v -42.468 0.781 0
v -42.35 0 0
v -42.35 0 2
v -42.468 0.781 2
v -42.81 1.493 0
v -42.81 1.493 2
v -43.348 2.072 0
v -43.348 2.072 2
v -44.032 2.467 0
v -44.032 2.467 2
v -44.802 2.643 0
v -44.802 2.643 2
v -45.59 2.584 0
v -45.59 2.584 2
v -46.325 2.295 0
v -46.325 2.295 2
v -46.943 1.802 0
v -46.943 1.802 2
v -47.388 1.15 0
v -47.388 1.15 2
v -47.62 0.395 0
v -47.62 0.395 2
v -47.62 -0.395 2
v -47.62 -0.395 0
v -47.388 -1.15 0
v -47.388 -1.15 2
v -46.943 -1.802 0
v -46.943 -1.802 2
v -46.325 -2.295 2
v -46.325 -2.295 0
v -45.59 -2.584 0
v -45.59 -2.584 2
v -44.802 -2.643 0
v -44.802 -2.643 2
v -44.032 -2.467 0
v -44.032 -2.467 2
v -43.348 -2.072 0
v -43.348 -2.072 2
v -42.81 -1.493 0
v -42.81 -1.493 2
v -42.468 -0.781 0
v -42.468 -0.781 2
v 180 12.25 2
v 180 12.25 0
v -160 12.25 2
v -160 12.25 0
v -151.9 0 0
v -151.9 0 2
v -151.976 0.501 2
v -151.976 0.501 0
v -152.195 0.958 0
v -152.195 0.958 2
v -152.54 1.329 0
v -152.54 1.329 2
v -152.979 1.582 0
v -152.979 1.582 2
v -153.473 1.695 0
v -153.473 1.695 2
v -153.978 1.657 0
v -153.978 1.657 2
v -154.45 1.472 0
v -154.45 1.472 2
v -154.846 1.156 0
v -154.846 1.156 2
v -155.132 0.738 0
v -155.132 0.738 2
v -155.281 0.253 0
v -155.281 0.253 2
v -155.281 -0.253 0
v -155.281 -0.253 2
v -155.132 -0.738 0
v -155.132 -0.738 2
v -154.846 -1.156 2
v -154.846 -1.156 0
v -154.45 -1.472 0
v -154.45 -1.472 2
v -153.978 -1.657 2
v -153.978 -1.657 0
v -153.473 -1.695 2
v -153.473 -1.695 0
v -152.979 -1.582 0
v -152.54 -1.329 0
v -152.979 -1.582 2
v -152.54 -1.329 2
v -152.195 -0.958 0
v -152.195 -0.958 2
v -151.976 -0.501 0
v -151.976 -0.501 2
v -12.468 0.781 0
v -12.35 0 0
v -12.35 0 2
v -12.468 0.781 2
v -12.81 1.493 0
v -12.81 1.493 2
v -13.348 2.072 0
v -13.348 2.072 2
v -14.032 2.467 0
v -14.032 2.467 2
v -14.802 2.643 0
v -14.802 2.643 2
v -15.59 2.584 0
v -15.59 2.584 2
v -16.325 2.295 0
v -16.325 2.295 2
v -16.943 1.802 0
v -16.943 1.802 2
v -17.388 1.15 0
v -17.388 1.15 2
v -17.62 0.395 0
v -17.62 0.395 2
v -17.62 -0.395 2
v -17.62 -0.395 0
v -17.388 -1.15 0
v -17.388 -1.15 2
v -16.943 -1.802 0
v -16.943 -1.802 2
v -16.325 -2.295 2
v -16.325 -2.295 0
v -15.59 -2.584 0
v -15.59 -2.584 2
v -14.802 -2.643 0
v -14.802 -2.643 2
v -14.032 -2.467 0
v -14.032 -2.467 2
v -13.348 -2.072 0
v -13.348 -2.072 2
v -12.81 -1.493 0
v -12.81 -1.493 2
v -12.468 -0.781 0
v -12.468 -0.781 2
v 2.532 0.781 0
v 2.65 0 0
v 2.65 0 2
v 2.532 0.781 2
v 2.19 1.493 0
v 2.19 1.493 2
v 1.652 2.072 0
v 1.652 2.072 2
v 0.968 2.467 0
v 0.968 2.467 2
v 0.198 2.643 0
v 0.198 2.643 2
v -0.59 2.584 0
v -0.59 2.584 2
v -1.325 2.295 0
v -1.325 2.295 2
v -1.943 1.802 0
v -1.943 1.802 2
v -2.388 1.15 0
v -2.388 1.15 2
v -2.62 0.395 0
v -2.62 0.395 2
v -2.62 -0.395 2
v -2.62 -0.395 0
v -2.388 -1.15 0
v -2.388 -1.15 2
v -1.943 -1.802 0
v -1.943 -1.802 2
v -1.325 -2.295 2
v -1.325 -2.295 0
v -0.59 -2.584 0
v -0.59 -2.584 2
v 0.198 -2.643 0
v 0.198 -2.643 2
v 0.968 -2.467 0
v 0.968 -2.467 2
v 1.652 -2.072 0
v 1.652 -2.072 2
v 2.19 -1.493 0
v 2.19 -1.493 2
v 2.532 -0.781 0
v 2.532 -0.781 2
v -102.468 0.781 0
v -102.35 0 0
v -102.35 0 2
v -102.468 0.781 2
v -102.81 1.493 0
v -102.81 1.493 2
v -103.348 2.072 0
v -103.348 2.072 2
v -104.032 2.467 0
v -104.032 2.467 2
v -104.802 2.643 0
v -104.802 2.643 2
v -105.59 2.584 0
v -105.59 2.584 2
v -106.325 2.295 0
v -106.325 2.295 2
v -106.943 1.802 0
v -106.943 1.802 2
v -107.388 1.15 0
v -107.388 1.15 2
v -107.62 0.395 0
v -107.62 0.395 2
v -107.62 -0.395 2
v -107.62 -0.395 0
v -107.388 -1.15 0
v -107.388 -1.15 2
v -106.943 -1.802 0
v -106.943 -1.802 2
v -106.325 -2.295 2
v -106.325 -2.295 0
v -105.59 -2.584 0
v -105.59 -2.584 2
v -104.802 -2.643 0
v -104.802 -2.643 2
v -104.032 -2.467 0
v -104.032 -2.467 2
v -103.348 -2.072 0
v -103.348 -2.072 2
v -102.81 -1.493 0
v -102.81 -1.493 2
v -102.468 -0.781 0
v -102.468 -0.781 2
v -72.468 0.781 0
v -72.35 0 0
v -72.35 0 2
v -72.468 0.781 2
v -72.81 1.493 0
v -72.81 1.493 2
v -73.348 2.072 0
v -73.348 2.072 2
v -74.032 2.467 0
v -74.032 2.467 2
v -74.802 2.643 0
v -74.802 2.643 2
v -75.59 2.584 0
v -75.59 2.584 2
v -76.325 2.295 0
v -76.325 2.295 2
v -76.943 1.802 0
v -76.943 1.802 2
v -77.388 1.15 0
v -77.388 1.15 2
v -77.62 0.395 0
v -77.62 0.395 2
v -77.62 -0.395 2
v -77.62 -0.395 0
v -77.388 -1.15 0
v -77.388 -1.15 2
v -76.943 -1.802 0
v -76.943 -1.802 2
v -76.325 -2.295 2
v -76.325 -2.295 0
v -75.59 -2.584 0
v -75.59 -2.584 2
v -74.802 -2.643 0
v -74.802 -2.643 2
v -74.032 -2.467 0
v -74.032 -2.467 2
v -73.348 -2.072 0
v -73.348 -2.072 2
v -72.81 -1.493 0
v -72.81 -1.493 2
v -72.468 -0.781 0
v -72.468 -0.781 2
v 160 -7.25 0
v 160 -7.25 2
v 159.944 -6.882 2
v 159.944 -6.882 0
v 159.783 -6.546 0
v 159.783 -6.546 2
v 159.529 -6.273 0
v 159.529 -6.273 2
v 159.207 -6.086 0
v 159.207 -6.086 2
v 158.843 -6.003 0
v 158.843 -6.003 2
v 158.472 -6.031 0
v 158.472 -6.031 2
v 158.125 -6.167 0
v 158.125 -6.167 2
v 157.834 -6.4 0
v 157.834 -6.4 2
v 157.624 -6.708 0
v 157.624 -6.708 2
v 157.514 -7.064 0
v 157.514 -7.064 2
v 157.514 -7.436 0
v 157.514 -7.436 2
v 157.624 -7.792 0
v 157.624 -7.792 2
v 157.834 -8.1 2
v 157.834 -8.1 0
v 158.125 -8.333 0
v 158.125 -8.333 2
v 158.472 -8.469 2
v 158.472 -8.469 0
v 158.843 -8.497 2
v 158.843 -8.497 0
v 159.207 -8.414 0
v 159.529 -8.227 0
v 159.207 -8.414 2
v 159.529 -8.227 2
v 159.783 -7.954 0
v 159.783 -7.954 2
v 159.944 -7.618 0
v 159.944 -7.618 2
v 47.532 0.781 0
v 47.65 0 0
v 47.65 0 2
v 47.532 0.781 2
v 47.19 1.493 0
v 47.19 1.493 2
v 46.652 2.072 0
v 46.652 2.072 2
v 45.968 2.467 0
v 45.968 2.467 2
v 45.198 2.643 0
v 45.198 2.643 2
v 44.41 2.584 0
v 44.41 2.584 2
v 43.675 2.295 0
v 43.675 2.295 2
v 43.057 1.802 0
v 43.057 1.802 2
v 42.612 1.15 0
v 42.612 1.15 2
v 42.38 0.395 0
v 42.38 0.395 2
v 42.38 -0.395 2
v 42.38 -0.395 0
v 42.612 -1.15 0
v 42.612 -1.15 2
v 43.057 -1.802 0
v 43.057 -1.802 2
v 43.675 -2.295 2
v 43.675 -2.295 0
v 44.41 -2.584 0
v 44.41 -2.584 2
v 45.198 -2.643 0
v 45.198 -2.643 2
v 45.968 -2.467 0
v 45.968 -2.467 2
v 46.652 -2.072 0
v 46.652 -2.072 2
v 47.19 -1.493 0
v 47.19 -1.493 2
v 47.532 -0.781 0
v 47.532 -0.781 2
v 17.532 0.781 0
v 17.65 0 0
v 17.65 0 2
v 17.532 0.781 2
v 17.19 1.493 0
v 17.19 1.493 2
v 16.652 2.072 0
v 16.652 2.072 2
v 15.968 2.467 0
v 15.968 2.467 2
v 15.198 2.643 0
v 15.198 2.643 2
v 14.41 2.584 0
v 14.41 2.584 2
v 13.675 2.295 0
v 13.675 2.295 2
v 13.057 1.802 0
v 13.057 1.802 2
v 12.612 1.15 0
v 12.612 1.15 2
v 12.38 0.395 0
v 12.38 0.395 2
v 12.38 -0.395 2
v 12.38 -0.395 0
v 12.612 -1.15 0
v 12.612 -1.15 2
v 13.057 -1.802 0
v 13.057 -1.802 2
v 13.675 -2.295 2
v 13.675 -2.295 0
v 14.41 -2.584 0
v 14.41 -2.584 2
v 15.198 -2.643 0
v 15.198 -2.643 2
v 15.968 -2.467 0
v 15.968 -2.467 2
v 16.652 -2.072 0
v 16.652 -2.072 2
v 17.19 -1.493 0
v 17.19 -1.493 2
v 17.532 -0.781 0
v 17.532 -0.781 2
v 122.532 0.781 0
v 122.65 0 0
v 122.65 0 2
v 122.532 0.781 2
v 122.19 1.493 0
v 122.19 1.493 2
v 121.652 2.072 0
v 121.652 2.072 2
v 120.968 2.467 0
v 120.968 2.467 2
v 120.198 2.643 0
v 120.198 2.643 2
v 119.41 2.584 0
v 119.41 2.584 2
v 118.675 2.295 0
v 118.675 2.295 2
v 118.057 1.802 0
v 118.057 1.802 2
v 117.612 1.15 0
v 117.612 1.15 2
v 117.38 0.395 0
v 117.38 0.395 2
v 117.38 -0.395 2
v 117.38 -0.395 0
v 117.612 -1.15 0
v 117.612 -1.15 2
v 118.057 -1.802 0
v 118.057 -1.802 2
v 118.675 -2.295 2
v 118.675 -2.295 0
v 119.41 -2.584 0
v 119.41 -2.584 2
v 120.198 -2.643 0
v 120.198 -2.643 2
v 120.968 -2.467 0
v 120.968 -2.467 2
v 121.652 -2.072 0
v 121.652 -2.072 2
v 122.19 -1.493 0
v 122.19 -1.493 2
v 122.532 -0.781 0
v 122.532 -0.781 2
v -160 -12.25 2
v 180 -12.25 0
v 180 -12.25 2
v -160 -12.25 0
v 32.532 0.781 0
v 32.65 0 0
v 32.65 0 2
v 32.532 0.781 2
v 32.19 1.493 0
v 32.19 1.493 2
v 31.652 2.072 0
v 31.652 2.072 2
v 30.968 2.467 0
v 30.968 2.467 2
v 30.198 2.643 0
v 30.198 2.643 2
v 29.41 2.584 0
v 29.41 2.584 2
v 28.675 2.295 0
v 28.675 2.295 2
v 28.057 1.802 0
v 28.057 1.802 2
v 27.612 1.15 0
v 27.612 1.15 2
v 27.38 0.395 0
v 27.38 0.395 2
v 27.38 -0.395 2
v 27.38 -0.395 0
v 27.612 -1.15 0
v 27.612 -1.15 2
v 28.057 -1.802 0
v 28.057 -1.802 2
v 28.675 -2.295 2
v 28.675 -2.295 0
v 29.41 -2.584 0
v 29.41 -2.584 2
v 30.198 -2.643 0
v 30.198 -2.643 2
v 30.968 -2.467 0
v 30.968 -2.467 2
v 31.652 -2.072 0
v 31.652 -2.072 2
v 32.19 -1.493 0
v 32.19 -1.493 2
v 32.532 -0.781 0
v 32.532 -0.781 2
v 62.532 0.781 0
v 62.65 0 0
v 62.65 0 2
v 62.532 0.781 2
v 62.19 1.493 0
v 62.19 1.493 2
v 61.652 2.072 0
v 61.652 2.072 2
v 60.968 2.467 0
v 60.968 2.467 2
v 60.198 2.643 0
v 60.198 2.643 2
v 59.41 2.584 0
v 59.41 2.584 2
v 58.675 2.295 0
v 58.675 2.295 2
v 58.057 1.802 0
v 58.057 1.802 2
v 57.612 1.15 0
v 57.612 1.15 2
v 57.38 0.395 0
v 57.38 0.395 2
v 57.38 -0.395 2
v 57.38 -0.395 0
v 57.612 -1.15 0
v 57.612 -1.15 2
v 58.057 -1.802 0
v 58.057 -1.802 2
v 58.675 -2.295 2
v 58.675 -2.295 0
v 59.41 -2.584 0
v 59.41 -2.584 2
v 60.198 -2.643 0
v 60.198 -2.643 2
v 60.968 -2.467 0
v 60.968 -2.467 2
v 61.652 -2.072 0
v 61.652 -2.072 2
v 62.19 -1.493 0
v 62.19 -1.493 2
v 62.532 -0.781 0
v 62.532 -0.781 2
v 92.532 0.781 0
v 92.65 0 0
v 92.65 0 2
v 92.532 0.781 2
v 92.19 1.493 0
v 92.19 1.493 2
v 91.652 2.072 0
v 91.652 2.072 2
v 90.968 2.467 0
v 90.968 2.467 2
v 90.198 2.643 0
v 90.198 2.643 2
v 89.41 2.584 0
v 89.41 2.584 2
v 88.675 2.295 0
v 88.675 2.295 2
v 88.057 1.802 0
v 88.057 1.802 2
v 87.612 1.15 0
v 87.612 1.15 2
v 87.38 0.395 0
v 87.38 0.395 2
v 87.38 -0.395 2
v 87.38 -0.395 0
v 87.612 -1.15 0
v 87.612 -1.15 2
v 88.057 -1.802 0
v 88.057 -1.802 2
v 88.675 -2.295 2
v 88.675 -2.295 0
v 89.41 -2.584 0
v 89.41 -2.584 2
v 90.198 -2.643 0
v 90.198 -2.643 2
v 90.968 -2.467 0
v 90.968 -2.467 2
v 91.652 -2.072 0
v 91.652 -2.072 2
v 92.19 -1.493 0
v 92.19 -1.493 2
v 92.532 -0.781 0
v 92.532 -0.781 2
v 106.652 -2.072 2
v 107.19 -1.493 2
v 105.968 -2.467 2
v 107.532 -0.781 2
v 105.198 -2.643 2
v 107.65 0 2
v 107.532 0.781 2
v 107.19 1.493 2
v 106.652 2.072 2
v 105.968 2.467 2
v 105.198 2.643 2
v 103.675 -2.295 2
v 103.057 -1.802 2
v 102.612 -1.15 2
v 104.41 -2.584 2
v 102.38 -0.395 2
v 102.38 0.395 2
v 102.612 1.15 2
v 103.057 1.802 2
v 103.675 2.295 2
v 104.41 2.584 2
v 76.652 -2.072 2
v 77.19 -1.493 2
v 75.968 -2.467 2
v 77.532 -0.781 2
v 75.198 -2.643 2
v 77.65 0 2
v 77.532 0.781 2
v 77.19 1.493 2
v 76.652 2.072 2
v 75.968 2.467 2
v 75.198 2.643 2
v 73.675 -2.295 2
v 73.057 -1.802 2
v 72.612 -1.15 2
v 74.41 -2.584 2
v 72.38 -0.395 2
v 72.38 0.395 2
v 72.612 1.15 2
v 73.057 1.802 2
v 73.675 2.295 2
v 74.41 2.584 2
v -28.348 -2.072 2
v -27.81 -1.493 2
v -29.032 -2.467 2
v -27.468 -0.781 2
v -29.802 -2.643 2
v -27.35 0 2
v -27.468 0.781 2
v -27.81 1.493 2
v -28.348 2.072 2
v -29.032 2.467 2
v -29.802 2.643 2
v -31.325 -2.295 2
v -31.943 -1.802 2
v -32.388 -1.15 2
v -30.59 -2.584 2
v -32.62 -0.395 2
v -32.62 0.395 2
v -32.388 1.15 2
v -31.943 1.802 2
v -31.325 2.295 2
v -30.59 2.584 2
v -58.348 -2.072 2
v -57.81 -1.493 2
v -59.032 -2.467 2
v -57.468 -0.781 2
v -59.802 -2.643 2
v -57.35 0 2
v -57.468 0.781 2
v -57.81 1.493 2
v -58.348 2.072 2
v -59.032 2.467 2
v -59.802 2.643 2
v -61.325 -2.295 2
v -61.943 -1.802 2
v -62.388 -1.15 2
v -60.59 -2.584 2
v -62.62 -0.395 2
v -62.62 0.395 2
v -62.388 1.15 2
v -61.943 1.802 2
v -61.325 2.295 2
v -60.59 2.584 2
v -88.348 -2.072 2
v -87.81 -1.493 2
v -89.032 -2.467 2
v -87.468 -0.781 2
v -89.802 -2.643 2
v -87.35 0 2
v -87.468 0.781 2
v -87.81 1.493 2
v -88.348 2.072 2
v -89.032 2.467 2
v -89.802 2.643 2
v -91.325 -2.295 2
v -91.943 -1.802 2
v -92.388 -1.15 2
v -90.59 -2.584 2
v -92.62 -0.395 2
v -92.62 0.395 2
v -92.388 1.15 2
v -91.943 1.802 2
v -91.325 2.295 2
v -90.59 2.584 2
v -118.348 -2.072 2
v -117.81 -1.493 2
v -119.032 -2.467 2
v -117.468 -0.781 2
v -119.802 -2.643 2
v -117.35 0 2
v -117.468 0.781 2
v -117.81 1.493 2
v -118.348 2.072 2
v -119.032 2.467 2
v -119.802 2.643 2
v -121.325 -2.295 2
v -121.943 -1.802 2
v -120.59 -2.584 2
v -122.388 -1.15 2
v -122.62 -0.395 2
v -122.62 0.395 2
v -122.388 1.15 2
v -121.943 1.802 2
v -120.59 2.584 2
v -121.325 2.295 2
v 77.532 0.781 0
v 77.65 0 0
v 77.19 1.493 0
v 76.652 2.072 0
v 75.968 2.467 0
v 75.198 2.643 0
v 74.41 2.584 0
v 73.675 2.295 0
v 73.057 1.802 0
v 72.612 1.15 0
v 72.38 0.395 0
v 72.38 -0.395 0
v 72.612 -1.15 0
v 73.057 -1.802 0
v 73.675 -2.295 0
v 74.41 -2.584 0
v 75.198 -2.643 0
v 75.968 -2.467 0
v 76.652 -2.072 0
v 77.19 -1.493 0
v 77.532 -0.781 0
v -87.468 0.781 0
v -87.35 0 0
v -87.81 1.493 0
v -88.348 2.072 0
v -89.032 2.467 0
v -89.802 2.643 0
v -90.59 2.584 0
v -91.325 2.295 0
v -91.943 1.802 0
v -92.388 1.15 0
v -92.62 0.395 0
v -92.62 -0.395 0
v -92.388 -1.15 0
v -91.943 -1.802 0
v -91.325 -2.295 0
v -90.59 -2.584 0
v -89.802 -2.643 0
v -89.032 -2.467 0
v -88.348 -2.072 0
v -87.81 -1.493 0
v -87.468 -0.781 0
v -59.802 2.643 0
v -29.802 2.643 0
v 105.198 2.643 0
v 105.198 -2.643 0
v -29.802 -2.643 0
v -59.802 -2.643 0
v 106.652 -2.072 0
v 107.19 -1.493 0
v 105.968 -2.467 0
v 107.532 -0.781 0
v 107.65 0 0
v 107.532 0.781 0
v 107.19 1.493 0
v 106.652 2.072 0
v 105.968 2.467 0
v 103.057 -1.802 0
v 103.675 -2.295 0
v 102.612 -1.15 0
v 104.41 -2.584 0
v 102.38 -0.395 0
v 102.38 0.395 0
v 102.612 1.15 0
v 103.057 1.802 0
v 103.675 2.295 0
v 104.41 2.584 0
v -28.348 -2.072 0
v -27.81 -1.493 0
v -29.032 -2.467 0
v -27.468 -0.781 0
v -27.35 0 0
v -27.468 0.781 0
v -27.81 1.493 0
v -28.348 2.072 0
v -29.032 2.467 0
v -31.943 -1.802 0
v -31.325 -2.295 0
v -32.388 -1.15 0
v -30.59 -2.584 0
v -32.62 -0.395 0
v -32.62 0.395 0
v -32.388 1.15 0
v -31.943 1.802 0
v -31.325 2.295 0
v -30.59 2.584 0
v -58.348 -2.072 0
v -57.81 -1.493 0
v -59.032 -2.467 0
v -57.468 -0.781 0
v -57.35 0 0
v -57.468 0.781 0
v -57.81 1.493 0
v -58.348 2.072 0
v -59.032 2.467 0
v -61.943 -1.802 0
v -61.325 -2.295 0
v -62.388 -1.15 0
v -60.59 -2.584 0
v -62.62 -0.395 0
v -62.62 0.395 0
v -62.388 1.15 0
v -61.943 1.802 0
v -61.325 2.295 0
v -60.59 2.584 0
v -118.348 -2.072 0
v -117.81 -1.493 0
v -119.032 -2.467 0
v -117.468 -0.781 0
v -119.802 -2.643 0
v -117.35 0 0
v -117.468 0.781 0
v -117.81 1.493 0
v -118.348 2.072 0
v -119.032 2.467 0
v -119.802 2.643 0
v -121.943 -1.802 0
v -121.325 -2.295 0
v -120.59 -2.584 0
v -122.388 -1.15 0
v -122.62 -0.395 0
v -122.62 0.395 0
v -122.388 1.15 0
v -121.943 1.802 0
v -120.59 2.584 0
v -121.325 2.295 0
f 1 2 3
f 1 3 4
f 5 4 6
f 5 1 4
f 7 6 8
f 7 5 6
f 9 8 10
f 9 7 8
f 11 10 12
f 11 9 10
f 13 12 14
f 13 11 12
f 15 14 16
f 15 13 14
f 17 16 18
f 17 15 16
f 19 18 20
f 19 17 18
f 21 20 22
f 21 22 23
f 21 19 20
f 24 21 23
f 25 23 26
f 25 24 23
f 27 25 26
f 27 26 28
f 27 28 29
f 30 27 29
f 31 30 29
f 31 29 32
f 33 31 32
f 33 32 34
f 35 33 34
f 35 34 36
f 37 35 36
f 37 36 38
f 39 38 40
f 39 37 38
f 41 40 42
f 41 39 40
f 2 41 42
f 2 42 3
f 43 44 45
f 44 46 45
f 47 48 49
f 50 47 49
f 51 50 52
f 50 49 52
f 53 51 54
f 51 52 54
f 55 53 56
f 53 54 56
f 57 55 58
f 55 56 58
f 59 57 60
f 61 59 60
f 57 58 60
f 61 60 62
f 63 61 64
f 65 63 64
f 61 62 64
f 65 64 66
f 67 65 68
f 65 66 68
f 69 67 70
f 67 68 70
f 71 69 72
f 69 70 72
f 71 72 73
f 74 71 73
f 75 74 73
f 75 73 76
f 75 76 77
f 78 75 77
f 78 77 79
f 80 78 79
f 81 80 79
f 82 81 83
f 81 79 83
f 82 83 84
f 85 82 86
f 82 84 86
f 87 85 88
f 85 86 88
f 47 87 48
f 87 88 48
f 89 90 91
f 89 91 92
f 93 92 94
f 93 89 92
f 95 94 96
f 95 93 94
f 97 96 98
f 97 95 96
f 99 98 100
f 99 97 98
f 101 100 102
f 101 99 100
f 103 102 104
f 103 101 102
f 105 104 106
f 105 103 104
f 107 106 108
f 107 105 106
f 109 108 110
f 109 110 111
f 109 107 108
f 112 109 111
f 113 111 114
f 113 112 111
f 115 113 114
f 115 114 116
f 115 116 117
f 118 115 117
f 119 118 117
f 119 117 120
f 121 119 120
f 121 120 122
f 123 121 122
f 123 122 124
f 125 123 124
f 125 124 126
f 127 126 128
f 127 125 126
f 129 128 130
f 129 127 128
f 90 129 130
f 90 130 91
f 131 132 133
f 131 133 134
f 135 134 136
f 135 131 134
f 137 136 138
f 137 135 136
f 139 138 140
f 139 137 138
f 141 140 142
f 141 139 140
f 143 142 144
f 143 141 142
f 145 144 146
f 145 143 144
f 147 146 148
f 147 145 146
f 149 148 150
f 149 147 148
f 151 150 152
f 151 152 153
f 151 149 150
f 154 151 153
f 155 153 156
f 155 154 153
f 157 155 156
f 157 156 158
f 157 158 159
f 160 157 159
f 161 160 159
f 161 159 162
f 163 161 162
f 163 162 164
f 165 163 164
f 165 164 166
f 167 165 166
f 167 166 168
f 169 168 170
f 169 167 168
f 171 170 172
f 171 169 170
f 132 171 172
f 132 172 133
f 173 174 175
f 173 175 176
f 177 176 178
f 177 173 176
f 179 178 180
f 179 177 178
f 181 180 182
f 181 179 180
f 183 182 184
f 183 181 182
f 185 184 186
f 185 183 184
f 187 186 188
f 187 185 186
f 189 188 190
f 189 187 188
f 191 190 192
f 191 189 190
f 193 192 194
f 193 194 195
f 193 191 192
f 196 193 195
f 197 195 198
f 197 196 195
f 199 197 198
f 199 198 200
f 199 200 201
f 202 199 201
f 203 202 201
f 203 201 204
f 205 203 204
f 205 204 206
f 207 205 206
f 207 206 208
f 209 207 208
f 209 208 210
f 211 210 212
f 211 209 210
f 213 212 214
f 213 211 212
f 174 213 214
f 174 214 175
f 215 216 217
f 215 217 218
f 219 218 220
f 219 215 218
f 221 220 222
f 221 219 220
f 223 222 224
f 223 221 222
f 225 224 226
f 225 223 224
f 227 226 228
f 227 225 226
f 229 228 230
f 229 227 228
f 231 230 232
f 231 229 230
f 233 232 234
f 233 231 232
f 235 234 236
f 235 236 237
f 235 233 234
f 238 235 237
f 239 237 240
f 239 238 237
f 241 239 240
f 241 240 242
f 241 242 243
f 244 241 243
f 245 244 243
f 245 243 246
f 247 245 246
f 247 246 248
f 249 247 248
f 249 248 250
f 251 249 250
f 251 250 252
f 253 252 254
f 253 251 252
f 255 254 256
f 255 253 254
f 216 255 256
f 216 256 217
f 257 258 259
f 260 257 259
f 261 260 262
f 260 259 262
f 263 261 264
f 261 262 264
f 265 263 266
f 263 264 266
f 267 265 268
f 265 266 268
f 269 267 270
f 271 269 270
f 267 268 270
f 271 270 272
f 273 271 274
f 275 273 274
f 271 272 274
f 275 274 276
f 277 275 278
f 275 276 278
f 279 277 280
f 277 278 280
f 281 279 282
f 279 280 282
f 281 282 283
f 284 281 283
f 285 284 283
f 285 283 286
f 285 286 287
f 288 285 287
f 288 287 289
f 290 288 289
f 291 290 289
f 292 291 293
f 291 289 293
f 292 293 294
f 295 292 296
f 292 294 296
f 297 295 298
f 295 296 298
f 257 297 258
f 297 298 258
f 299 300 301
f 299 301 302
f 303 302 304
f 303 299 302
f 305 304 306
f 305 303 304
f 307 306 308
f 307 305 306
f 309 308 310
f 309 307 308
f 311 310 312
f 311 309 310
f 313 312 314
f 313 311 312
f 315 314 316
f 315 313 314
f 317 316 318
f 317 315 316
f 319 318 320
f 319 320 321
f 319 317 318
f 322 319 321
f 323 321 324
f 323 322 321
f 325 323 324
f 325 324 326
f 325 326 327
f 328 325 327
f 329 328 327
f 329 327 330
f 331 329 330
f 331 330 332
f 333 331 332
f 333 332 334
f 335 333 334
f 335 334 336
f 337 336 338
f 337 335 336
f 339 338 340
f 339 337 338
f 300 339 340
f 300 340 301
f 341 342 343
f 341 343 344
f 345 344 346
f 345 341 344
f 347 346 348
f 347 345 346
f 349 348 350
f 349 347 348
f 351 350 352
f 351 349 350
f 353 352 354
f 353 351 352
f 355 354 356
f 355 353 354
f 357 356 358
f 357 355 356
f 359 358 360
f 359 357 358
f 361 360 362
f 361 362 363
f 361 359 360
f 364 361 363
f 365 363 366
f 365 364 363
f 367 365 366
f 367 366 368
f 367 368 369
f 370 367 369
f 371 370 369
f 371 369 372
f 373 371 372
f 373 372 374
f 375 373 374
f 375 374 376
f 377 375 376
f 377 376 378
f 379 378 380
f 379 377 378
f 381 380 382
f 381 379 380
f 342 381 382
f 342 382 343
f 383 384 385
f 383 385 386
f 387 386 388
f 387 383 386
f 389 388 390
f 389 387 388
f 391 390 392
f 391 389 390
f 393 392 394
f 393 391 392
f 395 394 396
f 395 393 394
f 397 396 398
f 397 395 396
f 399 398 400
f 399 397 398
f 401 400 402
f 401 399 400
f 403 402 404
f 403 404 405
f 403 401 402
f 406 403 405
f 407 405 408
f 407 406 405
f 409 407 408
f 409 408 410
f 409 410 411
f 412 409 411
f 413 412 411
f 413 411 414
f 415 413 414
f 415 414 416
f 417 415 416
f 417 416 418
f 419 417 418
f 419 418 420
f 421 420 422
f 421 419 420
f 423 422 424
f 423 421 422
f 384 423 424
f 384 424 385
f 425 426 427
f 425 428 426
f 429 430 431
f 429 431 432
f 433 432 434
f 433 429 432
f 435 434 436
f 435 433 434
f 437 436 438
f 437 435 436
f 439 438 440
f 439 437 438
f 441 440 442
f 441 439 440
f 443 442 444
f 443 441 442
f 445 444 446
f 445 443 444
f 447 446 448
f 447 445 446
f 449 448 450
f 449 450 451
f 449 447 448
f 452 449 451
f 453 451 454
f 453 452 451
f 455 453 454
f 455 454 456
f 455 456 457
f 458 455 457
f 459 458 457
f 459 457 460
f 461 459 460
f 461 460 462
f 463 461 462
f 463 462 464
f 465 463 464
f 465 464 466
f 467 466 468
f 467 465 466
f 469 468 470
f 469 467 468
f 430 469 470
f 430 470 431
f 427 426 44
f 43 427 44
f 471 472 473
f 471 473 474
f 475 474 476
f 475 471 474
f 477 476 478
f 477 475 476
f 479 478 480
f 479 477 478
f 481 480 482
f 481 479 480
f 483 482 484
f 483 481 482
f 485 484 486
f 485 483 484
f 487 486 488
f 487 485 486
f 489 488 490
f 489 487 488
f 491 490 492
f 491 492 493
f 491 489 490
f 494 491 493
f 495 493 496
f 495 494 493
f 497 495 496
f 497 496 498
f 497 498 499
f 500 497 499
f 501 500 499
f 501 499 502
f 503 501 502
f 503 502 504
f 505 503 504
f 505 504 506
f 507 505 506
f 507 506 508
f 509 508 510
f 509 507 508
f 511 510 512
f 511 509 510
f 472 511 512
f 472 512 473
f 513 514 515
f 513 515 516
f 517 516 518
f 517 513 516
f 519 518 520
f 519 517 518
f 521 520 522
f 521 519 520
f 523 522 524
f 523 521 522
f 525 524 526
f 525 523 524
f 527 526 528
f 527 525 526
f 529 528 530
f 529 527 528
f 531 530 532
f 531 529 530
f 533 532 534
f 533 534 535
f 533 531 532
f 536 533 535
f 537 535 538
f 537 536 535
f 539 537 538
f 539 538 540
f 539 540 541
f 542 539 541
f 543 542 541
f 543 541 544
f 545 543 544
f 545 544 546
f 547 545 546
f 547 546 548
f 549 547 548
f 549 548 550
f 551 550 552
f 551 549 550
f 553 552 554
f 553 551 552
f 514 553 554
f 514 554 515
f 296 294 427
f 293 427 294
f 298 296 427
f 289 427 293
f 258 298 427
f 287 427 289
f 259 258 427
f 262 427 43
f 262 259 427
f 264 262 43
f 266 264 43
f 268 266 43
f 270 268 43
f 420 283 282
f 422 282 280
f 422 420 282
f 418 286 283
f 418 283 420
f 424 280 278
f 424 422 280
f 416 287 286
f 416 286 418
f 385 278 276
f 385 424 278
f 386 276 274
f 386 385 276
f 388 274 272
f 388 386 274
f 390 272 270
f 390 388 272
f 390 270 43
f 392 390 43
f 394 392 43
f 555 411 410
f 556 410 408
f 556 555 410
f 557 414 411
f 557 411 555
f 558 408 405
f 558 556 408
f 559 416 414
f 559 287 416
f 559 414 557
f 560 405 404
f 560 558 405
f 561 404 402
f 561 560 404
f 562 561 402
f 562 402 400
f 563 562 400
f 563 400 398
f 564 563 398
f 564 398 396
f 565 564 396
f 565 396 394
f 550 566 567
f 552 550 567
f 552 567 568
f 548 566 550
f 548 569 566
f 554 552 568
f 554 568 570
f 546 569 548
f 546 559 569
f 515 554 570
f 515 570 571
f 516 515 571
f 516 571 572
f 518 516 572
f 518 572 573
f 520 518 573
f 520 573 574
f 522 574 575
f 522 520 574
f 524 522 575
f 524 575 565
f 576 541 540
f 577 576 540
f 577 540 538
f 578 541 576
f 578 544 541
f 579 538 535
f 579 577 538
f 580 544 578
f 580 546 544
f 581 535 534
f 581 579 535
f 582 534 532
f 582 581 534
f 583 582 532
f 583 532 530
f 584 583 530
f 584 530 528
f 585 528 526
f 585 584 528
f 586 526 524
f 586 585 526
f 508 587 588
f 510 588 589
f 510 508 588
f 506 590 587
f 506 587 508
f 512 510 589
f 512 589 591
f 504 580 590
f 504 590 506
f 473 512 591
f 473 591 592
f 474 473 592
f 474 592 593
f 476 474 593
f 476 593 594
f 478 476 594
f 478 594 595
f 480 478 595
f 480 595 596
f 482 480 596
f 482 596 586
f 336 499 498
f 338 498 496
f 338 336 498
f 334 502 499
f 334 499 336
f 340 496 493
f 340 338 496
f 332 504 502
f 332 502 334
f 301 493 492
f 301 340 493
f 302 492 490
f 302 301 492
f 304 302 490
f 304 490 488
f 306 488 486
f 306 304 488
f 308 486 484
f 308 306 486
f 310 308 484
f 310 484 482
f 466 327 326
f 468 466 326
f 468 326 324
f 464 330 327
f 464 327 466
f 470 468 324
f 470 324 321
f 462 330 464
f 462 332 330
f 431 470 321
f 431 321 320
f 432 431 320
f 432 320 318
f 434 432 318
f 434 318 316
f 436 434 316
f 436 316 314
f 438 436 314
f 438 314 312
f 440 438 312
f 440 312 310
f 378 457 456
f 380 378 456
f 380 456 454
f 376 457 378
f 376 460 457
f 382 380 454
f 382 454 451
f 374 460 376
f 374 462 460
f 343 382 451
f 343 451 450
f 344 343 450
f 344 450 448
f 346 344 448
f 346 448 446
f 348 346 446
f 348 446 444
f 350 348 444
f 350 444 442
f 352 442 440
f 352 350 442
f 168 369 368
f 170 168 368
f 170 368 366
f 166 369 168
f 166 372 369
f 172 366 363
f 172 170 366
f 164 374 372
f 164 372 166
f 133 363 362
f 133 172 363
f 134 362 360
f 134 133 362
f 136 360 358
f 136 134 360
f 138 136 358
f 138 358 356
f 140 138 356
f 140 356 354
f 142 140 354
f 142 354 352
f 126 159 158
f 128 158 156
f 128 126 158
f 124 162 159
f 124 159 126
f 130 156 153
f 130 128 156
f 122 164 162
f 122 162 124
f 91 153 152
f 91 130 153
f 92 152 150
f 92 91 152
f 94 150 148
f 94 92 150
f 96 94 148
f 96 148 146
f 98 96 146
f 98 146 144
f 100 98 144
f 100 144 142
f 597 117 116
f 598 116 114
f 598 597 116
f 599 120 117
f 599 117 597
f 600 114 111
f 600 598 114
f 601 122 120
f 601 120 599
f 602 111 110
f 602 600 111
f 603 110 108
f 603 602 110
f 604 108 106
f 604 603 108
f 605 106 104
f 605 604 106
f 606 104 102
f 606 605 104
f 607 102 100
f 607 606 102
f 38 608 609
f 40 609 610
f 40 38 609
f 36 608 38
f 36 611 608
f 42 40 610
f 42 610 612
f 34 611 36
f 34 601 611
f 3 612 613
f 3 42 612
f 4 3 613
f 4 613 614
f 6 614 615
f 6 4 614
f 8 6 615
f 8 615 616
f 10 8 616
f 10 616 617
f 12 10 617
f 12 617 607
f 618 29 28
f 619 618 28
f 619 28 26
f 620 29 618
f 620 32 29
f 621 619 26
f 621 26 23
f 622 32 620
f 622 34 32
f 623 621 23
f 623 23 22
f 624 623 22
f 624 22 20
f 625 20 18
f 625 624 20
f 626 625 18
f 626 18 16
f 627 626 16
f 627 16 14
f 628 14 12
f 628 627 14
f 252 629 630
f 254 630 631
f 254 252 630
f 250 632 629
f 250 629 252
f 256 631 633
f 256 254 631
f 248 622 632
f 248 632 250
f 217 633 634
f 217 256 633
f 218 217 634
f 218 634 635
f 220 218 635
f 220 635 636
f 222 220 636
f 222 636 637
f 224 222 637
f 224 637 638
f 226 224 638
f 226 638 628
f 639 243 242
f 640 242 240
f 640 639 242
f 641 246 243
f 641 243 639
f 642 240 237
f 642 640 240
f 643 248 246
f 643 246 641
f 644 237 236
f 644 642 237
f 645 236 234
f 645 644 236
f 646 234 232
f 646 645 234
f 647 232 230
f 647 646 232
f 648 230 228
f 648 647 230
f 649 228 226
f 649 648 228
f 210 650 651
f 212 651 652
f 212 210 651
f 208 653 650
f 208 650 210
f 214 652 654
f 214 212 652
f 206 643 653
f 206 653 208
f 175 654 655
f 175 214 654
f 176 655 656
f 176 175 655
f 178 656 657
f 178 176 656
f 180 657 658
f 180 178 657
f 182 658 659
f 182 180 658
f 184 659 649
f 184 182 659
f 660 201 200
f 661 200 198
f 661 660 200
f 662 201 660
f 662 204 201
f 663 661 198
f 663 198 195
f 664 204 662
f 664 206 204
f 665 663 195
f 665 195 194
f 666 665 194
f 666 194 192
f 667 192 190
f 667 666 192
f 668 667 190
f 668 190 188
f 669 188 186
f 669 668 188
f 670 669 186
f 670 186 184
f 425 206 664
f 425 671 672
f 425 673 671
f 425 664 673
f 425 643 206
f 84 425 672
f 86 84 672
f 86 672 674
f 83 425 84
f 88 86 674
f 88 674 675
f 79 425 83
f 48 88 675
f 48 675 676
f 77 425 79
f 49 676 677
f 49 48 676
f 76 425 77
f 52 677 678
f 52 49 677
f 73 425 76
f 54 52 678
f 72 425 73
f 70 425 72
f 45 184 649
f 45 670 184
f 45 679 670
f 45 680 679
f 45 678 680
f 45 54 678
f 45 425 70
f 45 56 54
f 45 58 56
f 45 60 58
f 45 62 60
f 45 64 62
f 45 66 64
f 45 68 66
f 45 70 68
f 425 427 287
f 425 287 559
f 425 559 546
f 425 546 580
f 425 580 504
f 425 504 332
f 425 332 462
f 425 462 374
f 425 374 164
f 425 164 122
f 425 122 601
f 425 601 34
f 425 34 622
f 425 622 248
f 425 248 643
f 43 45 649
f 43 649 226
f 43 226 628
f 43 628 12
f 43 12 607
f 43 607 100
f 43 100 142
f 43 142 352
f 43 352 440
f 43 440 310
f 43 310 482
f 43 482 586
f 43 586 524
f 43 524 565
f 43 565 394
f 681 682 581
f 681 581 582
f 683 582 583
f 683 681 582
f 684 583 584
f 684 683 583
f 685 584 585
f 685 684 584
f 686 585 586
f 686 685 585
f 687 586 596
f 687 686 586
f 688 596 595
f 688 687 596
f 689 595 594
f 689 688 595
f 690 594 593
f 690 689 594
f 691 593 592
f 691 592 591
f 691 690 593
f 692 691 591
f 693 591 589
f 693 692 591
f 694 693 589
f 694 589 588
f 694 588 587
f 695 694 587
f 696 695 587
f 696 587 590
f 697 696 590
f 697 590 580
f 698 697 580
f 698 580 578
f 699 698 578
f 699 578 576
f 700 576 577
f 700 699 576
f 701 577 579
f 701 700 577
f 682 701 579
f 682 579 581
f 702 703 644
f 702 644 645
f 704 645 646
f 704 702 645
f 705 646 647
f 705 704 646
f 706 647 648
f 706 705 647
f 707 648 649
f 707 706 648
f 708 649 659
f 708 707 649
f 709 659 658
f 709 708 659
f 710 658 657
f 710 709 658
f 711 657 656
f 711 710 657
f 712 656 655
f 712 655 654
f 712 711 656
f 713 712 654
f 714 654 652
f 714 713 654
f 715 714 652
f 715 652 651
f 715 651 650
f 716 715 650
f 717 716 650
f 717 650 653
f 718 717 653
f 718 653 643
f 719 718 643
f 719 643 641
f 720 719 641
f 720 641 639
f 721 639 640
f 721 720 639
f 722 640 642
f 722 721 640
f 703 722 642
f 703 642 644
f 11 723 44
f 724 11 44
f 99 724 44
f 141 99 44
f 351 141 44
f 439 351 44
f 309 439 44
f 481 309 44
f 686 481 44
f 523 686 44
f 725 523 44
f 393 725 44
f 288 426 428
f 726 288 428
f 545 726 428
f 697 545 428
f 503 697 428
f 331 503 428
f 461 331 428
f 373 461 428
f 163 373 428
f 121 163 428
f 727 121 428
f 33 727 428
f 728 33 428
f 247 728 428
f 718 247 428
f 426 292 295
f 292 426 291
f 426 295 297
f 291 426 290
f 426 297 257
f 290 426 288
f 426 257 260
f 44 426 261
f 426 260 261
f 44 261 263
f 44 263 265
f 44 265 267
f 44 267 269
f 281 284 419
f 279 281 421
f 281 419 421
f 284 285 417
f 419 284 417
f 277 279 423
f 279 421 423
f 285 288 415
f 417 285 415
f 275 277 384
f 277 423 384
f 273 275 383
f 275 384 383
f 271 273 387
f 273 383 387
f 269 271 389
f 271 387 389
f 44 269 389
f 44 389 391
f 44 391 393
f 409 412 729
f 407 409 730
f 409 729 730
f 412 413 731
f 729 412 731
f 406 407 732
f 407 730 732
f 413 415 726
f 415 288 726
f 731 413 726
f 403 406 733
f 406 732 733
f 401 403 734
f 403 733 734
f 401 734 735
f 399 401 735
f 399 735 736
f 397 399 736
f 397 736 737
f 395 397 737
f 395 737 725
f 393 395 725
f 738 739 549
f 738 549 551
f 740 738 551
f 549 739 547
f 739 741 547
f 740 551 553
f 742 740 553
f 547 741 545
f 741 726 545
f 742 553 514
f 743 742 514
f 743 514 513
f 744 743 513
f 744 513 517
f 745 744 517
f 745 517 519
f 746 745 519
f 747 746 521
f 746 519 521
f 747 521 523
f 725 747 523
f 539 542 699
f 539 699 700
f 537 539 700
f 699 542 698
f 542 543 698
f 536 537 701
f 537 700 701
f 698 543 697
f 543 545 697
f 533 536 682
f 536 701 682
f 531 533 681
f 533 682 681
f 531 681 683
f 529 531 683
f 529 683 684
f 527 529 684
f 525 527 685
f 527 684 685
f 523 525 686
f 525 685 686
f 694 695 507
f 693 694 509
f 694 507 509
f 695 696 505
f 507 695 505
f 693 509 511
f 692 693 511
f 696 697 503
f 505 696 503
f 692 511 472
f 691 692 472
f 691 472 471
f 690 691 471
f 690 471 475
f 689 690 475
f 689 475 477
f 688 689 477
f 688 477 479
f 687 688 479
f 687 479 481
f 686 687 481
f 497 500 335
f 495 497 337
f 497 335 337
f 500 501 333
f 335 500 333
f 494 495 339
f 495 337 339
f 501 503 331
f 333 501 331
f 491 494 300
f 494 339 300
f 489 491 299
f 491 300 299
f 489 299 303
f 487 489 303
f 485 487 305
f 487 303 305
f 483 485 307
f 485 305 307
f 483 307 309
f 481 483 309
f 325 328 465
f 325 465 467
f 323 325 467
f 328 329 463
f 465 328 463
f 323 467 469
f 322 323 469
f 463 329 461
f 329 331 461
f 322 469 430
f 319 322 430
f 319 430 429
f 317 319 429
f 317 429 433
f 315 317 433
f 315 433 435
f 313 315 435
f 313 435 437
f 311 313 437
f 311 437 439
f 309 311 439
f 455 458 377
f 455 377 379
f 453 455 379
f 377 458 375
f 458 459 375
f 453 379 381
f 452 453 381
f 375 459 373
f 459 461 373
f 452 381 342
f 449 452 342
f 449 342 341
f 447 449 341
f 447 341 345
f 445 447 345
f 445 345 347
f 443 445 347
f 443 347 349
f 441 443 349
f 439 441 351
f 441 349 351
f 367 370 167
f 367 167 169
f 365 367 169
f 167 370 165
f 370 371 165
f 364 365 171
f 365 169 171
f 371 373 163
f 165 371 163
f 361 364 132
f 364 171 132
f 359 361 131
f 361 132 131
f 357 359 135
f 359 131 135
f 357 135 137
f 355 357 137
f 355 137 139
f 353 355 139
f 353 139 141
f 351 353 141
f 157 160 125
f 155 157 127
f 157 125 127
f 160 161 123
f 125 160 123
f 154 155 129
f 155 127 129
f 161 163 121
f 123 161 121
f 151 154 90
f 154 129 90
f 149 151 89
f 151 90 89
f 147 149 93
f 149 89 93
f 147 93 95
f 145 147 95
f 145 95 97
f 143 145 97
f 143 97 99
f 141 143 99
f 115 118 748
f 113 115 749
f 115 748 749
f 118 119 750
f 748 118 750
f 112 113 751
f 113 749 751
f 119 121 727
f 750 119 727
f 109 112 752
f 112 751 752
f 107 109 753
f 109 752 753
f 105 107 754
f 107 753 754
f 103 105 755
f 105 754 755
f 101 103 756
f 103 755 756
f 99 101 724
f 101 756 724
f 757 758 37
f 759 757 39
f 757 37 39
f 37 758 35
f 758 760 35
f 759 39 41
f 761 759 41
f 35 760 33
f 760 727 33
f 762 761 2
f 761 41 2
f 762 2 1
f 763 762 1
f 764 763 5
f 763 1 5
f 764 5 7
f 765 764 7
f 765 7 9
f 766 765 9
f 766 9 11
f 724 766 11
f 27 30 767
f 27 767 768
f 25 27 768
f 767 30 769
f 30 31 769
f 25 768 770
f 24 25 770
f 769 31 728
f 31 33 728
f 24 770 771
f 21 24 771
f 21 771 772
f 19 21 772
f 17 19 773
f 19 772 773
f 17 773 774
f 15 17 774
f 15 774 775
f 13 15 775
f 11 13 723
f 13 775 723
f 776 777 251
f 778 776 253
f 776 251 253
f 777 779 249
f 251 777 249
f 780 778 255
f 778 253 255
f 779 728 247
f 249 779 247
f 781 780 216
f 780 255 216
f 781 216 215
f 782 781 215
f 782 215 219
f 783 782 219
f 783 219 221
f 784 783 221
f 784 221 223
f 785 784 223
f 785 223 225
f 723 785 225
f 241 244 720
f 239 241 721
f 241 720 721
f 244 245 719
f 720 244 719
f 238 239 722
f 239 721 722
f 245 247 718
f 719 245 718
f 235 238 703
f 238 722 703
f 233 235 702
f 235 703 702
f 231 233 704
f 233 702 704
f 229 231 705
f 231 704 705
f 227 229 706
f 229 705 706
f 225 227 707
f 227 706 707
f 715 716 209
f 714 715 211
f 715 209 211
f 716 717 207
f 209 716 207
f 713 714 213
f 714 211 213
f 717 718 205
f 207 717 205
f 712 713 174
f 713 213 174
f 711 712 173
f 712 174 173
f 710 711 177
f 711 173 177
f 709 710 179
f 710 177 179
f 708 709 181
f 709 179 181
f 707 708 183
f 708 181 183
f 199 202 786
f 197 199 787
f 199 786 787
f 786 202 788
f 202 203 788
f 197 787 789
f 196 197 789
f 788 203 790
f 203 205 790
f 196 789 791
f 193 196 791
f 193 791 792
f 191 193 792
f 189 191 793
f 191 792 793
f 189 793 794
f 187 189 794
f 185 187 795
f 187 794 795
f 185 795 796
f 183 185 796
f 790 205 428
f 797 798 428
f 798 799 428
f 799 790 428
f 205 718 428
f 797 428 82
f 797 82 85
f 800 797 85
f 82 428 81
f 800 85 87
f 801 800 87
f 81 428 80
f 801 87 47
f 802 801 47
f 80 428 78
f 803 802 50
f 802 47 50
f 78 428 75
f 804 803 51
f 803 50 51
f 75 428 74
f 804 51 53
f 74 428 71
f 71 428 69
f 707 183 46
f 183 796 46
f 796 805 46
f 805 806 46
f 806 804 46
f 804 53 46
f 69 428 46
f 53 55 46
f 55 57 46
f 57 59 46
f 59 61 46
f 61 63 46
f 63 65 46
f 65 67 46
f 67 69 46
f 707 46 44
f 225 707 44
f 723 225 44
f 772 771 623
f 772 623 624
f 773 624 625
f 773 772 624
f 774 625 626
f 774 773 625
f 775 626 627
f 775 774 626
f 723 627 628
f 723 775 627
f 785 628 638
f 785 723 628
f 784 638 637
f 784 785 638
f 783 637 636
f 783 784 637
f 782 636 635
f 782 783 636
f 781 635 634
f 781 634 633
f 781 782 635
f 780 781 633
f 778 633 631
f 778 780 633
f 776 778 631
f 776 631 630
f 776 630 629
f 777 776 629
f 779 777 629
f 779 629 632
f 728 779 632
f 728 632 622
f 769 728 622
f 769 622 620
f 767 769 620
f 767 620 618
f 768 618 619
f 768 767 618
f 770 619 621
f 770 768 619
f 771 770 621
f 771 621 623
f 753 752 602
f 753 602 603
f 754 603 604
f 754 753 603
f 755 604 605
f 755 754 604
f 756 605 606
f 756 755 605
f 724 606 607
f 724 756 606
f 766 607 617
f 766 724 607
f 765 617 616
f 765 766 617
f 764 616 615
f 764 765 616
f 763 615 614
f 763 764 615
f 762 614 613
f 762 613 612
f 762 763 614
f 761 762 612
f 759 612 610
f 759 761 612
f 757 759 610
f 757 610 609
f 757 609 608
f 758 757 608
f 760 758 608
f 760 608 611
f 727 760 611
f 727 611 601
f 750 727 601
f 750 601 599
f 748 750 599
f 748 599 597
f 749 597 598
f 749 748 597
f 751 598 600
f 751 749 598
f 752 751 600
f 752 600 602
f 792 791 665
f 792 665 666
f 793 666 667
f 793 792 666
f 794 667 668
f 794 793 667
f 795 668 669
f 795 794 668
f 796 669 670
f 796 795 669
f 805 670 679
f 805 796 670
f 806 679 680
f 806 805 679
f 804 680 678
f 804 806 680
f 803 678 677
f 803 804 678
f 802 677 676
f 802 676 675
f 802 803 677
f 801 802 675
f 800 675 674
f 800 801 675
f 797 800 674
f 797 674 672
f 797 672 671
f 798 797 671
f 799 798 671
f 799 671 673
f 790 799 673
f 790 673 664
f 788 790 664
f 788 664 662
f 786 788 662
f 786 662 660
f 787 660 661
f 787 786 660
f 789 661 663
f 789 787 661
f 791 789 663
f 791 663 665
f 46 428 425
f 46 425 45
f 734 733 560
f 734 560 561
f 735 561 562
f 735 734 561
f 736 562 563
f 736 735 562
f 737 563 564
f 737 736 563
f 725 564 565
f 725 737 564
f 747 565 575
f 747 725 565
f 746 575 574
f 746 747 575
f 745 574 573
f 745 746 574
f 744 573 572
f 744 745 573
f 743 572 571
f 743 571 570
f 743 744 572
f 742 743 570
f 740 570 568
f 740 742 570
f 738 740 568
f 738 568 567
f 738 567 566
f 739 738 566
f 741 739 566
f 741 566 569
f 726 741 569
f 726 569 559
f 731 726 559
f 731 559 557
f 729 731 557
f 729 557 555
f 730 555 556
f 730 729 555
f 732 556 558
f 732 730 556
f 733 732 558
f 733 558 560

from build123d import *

# Parameters (mm, degrees)
F0_W     = 300
F0_H     = 24.5
F0_R     = 2.65
F1_DEPTH = 2
F2_DEPTH = 10
F3_DEPTH = 30
F4_R     = 1.7
F5_DEPTH = 2
F6_R     = 1.25
F7_DEPTH = 2


with BuildPart() as f1:
    # F0 (on Top) → F1 (new body)
    with BuildSketch(Plane.XY):
        Rectangle(F0_W, F0_H)
        with Locations((-120, 0)):
            Circle(F0_R, mode=Mode.SUBTRACT)
        with Locations((-105, 0)):
            Circle(F0_R, mode=Mode.SUBTRACT)
        with Locations((-90, 0)):
            Circle(F0_R, mode=Mode.SUBTRACT)
        with Locations((-75, 0)):
            Circle(F0_R, mode=Mode.SUBTRACT)
        with Locations((-60, 0)):
            Circle(F0_R, mode=Mode.SUBTRACT)
        with Locations((-45, 0)):
            Circle(F0_R, mode=Mode.SUBTRACT)
        with Locations((-30, 0)):
            Circle(F0_R, mode=Mode.SUBTRACT)
        with Locations((-15, 0)):
            Circle(F0_R, mode=Mode.SUBTRACT)
        Circle(F0_R, mode=Mode.SUBTRACT)
        with Locations((15, 0)):
            Circle(F0_R, mode=Mode.SUBTRACT)
        with Locations((30, 0)):
            Circle(F0_R, mode=Mode.SUBTRACT)
        with Locations((45, 0)):
            Circle(F0_R, mode=Mode.SUBTRACT)
        with Locations((60, 0)):
            Circle(F0_R, mode=Mode.SUBTRACT)
        with Locations((75, 0)):
            Circle(F0_R, mode=Mode.SUBTRACT)
        with Locations((90, 0)):
            Circle(F0_R, mode=Mode.SUBTRACT)
        with Locations((105, 0)):
            Circle(F0_R, mode=Mode.SUBTRACT)
        with Locations((120, 0)):
            Circle(F0_R, mode=Mode.SUBTRACT)
    extrude(amount=F1_DEPTH)

    # F2 (add): a face of the model
    f2_faces = [f1.faces().sort_by_distance(p)[0] for p in [
        (-150, 0, 1),
    ]]
    extrude(f2_faces, amount=F2_DEPTH)

    # F3 (add): a face of the model
    f3_faces = [f1.faces().sort_by_distance(p)[0] for p in [
        (150, 0, 1),
    ]]
    extrude(f3_faces, amount=F3_DEPTH)

    # F4 (on face) → F5 (cut, through all)
    with BuildSketch(Plane.XY.offset(2)):
        with Locations((-153.6, 0)):
            Circle(F4_R)
    extrude(amount=-F5_DEPTH, mode=Mode.SUBTRACT)

    # F6 (on face) → F7 (cut, through all)
    with BuildSketch(Plane.XY.offset(2)):
        with Locations((158.75, -7.25)):
            Circle(F6_R)
    extrude(amount=-F7_DEPTH, mode=Mode.SUBTRACT)


solid = f1.part
